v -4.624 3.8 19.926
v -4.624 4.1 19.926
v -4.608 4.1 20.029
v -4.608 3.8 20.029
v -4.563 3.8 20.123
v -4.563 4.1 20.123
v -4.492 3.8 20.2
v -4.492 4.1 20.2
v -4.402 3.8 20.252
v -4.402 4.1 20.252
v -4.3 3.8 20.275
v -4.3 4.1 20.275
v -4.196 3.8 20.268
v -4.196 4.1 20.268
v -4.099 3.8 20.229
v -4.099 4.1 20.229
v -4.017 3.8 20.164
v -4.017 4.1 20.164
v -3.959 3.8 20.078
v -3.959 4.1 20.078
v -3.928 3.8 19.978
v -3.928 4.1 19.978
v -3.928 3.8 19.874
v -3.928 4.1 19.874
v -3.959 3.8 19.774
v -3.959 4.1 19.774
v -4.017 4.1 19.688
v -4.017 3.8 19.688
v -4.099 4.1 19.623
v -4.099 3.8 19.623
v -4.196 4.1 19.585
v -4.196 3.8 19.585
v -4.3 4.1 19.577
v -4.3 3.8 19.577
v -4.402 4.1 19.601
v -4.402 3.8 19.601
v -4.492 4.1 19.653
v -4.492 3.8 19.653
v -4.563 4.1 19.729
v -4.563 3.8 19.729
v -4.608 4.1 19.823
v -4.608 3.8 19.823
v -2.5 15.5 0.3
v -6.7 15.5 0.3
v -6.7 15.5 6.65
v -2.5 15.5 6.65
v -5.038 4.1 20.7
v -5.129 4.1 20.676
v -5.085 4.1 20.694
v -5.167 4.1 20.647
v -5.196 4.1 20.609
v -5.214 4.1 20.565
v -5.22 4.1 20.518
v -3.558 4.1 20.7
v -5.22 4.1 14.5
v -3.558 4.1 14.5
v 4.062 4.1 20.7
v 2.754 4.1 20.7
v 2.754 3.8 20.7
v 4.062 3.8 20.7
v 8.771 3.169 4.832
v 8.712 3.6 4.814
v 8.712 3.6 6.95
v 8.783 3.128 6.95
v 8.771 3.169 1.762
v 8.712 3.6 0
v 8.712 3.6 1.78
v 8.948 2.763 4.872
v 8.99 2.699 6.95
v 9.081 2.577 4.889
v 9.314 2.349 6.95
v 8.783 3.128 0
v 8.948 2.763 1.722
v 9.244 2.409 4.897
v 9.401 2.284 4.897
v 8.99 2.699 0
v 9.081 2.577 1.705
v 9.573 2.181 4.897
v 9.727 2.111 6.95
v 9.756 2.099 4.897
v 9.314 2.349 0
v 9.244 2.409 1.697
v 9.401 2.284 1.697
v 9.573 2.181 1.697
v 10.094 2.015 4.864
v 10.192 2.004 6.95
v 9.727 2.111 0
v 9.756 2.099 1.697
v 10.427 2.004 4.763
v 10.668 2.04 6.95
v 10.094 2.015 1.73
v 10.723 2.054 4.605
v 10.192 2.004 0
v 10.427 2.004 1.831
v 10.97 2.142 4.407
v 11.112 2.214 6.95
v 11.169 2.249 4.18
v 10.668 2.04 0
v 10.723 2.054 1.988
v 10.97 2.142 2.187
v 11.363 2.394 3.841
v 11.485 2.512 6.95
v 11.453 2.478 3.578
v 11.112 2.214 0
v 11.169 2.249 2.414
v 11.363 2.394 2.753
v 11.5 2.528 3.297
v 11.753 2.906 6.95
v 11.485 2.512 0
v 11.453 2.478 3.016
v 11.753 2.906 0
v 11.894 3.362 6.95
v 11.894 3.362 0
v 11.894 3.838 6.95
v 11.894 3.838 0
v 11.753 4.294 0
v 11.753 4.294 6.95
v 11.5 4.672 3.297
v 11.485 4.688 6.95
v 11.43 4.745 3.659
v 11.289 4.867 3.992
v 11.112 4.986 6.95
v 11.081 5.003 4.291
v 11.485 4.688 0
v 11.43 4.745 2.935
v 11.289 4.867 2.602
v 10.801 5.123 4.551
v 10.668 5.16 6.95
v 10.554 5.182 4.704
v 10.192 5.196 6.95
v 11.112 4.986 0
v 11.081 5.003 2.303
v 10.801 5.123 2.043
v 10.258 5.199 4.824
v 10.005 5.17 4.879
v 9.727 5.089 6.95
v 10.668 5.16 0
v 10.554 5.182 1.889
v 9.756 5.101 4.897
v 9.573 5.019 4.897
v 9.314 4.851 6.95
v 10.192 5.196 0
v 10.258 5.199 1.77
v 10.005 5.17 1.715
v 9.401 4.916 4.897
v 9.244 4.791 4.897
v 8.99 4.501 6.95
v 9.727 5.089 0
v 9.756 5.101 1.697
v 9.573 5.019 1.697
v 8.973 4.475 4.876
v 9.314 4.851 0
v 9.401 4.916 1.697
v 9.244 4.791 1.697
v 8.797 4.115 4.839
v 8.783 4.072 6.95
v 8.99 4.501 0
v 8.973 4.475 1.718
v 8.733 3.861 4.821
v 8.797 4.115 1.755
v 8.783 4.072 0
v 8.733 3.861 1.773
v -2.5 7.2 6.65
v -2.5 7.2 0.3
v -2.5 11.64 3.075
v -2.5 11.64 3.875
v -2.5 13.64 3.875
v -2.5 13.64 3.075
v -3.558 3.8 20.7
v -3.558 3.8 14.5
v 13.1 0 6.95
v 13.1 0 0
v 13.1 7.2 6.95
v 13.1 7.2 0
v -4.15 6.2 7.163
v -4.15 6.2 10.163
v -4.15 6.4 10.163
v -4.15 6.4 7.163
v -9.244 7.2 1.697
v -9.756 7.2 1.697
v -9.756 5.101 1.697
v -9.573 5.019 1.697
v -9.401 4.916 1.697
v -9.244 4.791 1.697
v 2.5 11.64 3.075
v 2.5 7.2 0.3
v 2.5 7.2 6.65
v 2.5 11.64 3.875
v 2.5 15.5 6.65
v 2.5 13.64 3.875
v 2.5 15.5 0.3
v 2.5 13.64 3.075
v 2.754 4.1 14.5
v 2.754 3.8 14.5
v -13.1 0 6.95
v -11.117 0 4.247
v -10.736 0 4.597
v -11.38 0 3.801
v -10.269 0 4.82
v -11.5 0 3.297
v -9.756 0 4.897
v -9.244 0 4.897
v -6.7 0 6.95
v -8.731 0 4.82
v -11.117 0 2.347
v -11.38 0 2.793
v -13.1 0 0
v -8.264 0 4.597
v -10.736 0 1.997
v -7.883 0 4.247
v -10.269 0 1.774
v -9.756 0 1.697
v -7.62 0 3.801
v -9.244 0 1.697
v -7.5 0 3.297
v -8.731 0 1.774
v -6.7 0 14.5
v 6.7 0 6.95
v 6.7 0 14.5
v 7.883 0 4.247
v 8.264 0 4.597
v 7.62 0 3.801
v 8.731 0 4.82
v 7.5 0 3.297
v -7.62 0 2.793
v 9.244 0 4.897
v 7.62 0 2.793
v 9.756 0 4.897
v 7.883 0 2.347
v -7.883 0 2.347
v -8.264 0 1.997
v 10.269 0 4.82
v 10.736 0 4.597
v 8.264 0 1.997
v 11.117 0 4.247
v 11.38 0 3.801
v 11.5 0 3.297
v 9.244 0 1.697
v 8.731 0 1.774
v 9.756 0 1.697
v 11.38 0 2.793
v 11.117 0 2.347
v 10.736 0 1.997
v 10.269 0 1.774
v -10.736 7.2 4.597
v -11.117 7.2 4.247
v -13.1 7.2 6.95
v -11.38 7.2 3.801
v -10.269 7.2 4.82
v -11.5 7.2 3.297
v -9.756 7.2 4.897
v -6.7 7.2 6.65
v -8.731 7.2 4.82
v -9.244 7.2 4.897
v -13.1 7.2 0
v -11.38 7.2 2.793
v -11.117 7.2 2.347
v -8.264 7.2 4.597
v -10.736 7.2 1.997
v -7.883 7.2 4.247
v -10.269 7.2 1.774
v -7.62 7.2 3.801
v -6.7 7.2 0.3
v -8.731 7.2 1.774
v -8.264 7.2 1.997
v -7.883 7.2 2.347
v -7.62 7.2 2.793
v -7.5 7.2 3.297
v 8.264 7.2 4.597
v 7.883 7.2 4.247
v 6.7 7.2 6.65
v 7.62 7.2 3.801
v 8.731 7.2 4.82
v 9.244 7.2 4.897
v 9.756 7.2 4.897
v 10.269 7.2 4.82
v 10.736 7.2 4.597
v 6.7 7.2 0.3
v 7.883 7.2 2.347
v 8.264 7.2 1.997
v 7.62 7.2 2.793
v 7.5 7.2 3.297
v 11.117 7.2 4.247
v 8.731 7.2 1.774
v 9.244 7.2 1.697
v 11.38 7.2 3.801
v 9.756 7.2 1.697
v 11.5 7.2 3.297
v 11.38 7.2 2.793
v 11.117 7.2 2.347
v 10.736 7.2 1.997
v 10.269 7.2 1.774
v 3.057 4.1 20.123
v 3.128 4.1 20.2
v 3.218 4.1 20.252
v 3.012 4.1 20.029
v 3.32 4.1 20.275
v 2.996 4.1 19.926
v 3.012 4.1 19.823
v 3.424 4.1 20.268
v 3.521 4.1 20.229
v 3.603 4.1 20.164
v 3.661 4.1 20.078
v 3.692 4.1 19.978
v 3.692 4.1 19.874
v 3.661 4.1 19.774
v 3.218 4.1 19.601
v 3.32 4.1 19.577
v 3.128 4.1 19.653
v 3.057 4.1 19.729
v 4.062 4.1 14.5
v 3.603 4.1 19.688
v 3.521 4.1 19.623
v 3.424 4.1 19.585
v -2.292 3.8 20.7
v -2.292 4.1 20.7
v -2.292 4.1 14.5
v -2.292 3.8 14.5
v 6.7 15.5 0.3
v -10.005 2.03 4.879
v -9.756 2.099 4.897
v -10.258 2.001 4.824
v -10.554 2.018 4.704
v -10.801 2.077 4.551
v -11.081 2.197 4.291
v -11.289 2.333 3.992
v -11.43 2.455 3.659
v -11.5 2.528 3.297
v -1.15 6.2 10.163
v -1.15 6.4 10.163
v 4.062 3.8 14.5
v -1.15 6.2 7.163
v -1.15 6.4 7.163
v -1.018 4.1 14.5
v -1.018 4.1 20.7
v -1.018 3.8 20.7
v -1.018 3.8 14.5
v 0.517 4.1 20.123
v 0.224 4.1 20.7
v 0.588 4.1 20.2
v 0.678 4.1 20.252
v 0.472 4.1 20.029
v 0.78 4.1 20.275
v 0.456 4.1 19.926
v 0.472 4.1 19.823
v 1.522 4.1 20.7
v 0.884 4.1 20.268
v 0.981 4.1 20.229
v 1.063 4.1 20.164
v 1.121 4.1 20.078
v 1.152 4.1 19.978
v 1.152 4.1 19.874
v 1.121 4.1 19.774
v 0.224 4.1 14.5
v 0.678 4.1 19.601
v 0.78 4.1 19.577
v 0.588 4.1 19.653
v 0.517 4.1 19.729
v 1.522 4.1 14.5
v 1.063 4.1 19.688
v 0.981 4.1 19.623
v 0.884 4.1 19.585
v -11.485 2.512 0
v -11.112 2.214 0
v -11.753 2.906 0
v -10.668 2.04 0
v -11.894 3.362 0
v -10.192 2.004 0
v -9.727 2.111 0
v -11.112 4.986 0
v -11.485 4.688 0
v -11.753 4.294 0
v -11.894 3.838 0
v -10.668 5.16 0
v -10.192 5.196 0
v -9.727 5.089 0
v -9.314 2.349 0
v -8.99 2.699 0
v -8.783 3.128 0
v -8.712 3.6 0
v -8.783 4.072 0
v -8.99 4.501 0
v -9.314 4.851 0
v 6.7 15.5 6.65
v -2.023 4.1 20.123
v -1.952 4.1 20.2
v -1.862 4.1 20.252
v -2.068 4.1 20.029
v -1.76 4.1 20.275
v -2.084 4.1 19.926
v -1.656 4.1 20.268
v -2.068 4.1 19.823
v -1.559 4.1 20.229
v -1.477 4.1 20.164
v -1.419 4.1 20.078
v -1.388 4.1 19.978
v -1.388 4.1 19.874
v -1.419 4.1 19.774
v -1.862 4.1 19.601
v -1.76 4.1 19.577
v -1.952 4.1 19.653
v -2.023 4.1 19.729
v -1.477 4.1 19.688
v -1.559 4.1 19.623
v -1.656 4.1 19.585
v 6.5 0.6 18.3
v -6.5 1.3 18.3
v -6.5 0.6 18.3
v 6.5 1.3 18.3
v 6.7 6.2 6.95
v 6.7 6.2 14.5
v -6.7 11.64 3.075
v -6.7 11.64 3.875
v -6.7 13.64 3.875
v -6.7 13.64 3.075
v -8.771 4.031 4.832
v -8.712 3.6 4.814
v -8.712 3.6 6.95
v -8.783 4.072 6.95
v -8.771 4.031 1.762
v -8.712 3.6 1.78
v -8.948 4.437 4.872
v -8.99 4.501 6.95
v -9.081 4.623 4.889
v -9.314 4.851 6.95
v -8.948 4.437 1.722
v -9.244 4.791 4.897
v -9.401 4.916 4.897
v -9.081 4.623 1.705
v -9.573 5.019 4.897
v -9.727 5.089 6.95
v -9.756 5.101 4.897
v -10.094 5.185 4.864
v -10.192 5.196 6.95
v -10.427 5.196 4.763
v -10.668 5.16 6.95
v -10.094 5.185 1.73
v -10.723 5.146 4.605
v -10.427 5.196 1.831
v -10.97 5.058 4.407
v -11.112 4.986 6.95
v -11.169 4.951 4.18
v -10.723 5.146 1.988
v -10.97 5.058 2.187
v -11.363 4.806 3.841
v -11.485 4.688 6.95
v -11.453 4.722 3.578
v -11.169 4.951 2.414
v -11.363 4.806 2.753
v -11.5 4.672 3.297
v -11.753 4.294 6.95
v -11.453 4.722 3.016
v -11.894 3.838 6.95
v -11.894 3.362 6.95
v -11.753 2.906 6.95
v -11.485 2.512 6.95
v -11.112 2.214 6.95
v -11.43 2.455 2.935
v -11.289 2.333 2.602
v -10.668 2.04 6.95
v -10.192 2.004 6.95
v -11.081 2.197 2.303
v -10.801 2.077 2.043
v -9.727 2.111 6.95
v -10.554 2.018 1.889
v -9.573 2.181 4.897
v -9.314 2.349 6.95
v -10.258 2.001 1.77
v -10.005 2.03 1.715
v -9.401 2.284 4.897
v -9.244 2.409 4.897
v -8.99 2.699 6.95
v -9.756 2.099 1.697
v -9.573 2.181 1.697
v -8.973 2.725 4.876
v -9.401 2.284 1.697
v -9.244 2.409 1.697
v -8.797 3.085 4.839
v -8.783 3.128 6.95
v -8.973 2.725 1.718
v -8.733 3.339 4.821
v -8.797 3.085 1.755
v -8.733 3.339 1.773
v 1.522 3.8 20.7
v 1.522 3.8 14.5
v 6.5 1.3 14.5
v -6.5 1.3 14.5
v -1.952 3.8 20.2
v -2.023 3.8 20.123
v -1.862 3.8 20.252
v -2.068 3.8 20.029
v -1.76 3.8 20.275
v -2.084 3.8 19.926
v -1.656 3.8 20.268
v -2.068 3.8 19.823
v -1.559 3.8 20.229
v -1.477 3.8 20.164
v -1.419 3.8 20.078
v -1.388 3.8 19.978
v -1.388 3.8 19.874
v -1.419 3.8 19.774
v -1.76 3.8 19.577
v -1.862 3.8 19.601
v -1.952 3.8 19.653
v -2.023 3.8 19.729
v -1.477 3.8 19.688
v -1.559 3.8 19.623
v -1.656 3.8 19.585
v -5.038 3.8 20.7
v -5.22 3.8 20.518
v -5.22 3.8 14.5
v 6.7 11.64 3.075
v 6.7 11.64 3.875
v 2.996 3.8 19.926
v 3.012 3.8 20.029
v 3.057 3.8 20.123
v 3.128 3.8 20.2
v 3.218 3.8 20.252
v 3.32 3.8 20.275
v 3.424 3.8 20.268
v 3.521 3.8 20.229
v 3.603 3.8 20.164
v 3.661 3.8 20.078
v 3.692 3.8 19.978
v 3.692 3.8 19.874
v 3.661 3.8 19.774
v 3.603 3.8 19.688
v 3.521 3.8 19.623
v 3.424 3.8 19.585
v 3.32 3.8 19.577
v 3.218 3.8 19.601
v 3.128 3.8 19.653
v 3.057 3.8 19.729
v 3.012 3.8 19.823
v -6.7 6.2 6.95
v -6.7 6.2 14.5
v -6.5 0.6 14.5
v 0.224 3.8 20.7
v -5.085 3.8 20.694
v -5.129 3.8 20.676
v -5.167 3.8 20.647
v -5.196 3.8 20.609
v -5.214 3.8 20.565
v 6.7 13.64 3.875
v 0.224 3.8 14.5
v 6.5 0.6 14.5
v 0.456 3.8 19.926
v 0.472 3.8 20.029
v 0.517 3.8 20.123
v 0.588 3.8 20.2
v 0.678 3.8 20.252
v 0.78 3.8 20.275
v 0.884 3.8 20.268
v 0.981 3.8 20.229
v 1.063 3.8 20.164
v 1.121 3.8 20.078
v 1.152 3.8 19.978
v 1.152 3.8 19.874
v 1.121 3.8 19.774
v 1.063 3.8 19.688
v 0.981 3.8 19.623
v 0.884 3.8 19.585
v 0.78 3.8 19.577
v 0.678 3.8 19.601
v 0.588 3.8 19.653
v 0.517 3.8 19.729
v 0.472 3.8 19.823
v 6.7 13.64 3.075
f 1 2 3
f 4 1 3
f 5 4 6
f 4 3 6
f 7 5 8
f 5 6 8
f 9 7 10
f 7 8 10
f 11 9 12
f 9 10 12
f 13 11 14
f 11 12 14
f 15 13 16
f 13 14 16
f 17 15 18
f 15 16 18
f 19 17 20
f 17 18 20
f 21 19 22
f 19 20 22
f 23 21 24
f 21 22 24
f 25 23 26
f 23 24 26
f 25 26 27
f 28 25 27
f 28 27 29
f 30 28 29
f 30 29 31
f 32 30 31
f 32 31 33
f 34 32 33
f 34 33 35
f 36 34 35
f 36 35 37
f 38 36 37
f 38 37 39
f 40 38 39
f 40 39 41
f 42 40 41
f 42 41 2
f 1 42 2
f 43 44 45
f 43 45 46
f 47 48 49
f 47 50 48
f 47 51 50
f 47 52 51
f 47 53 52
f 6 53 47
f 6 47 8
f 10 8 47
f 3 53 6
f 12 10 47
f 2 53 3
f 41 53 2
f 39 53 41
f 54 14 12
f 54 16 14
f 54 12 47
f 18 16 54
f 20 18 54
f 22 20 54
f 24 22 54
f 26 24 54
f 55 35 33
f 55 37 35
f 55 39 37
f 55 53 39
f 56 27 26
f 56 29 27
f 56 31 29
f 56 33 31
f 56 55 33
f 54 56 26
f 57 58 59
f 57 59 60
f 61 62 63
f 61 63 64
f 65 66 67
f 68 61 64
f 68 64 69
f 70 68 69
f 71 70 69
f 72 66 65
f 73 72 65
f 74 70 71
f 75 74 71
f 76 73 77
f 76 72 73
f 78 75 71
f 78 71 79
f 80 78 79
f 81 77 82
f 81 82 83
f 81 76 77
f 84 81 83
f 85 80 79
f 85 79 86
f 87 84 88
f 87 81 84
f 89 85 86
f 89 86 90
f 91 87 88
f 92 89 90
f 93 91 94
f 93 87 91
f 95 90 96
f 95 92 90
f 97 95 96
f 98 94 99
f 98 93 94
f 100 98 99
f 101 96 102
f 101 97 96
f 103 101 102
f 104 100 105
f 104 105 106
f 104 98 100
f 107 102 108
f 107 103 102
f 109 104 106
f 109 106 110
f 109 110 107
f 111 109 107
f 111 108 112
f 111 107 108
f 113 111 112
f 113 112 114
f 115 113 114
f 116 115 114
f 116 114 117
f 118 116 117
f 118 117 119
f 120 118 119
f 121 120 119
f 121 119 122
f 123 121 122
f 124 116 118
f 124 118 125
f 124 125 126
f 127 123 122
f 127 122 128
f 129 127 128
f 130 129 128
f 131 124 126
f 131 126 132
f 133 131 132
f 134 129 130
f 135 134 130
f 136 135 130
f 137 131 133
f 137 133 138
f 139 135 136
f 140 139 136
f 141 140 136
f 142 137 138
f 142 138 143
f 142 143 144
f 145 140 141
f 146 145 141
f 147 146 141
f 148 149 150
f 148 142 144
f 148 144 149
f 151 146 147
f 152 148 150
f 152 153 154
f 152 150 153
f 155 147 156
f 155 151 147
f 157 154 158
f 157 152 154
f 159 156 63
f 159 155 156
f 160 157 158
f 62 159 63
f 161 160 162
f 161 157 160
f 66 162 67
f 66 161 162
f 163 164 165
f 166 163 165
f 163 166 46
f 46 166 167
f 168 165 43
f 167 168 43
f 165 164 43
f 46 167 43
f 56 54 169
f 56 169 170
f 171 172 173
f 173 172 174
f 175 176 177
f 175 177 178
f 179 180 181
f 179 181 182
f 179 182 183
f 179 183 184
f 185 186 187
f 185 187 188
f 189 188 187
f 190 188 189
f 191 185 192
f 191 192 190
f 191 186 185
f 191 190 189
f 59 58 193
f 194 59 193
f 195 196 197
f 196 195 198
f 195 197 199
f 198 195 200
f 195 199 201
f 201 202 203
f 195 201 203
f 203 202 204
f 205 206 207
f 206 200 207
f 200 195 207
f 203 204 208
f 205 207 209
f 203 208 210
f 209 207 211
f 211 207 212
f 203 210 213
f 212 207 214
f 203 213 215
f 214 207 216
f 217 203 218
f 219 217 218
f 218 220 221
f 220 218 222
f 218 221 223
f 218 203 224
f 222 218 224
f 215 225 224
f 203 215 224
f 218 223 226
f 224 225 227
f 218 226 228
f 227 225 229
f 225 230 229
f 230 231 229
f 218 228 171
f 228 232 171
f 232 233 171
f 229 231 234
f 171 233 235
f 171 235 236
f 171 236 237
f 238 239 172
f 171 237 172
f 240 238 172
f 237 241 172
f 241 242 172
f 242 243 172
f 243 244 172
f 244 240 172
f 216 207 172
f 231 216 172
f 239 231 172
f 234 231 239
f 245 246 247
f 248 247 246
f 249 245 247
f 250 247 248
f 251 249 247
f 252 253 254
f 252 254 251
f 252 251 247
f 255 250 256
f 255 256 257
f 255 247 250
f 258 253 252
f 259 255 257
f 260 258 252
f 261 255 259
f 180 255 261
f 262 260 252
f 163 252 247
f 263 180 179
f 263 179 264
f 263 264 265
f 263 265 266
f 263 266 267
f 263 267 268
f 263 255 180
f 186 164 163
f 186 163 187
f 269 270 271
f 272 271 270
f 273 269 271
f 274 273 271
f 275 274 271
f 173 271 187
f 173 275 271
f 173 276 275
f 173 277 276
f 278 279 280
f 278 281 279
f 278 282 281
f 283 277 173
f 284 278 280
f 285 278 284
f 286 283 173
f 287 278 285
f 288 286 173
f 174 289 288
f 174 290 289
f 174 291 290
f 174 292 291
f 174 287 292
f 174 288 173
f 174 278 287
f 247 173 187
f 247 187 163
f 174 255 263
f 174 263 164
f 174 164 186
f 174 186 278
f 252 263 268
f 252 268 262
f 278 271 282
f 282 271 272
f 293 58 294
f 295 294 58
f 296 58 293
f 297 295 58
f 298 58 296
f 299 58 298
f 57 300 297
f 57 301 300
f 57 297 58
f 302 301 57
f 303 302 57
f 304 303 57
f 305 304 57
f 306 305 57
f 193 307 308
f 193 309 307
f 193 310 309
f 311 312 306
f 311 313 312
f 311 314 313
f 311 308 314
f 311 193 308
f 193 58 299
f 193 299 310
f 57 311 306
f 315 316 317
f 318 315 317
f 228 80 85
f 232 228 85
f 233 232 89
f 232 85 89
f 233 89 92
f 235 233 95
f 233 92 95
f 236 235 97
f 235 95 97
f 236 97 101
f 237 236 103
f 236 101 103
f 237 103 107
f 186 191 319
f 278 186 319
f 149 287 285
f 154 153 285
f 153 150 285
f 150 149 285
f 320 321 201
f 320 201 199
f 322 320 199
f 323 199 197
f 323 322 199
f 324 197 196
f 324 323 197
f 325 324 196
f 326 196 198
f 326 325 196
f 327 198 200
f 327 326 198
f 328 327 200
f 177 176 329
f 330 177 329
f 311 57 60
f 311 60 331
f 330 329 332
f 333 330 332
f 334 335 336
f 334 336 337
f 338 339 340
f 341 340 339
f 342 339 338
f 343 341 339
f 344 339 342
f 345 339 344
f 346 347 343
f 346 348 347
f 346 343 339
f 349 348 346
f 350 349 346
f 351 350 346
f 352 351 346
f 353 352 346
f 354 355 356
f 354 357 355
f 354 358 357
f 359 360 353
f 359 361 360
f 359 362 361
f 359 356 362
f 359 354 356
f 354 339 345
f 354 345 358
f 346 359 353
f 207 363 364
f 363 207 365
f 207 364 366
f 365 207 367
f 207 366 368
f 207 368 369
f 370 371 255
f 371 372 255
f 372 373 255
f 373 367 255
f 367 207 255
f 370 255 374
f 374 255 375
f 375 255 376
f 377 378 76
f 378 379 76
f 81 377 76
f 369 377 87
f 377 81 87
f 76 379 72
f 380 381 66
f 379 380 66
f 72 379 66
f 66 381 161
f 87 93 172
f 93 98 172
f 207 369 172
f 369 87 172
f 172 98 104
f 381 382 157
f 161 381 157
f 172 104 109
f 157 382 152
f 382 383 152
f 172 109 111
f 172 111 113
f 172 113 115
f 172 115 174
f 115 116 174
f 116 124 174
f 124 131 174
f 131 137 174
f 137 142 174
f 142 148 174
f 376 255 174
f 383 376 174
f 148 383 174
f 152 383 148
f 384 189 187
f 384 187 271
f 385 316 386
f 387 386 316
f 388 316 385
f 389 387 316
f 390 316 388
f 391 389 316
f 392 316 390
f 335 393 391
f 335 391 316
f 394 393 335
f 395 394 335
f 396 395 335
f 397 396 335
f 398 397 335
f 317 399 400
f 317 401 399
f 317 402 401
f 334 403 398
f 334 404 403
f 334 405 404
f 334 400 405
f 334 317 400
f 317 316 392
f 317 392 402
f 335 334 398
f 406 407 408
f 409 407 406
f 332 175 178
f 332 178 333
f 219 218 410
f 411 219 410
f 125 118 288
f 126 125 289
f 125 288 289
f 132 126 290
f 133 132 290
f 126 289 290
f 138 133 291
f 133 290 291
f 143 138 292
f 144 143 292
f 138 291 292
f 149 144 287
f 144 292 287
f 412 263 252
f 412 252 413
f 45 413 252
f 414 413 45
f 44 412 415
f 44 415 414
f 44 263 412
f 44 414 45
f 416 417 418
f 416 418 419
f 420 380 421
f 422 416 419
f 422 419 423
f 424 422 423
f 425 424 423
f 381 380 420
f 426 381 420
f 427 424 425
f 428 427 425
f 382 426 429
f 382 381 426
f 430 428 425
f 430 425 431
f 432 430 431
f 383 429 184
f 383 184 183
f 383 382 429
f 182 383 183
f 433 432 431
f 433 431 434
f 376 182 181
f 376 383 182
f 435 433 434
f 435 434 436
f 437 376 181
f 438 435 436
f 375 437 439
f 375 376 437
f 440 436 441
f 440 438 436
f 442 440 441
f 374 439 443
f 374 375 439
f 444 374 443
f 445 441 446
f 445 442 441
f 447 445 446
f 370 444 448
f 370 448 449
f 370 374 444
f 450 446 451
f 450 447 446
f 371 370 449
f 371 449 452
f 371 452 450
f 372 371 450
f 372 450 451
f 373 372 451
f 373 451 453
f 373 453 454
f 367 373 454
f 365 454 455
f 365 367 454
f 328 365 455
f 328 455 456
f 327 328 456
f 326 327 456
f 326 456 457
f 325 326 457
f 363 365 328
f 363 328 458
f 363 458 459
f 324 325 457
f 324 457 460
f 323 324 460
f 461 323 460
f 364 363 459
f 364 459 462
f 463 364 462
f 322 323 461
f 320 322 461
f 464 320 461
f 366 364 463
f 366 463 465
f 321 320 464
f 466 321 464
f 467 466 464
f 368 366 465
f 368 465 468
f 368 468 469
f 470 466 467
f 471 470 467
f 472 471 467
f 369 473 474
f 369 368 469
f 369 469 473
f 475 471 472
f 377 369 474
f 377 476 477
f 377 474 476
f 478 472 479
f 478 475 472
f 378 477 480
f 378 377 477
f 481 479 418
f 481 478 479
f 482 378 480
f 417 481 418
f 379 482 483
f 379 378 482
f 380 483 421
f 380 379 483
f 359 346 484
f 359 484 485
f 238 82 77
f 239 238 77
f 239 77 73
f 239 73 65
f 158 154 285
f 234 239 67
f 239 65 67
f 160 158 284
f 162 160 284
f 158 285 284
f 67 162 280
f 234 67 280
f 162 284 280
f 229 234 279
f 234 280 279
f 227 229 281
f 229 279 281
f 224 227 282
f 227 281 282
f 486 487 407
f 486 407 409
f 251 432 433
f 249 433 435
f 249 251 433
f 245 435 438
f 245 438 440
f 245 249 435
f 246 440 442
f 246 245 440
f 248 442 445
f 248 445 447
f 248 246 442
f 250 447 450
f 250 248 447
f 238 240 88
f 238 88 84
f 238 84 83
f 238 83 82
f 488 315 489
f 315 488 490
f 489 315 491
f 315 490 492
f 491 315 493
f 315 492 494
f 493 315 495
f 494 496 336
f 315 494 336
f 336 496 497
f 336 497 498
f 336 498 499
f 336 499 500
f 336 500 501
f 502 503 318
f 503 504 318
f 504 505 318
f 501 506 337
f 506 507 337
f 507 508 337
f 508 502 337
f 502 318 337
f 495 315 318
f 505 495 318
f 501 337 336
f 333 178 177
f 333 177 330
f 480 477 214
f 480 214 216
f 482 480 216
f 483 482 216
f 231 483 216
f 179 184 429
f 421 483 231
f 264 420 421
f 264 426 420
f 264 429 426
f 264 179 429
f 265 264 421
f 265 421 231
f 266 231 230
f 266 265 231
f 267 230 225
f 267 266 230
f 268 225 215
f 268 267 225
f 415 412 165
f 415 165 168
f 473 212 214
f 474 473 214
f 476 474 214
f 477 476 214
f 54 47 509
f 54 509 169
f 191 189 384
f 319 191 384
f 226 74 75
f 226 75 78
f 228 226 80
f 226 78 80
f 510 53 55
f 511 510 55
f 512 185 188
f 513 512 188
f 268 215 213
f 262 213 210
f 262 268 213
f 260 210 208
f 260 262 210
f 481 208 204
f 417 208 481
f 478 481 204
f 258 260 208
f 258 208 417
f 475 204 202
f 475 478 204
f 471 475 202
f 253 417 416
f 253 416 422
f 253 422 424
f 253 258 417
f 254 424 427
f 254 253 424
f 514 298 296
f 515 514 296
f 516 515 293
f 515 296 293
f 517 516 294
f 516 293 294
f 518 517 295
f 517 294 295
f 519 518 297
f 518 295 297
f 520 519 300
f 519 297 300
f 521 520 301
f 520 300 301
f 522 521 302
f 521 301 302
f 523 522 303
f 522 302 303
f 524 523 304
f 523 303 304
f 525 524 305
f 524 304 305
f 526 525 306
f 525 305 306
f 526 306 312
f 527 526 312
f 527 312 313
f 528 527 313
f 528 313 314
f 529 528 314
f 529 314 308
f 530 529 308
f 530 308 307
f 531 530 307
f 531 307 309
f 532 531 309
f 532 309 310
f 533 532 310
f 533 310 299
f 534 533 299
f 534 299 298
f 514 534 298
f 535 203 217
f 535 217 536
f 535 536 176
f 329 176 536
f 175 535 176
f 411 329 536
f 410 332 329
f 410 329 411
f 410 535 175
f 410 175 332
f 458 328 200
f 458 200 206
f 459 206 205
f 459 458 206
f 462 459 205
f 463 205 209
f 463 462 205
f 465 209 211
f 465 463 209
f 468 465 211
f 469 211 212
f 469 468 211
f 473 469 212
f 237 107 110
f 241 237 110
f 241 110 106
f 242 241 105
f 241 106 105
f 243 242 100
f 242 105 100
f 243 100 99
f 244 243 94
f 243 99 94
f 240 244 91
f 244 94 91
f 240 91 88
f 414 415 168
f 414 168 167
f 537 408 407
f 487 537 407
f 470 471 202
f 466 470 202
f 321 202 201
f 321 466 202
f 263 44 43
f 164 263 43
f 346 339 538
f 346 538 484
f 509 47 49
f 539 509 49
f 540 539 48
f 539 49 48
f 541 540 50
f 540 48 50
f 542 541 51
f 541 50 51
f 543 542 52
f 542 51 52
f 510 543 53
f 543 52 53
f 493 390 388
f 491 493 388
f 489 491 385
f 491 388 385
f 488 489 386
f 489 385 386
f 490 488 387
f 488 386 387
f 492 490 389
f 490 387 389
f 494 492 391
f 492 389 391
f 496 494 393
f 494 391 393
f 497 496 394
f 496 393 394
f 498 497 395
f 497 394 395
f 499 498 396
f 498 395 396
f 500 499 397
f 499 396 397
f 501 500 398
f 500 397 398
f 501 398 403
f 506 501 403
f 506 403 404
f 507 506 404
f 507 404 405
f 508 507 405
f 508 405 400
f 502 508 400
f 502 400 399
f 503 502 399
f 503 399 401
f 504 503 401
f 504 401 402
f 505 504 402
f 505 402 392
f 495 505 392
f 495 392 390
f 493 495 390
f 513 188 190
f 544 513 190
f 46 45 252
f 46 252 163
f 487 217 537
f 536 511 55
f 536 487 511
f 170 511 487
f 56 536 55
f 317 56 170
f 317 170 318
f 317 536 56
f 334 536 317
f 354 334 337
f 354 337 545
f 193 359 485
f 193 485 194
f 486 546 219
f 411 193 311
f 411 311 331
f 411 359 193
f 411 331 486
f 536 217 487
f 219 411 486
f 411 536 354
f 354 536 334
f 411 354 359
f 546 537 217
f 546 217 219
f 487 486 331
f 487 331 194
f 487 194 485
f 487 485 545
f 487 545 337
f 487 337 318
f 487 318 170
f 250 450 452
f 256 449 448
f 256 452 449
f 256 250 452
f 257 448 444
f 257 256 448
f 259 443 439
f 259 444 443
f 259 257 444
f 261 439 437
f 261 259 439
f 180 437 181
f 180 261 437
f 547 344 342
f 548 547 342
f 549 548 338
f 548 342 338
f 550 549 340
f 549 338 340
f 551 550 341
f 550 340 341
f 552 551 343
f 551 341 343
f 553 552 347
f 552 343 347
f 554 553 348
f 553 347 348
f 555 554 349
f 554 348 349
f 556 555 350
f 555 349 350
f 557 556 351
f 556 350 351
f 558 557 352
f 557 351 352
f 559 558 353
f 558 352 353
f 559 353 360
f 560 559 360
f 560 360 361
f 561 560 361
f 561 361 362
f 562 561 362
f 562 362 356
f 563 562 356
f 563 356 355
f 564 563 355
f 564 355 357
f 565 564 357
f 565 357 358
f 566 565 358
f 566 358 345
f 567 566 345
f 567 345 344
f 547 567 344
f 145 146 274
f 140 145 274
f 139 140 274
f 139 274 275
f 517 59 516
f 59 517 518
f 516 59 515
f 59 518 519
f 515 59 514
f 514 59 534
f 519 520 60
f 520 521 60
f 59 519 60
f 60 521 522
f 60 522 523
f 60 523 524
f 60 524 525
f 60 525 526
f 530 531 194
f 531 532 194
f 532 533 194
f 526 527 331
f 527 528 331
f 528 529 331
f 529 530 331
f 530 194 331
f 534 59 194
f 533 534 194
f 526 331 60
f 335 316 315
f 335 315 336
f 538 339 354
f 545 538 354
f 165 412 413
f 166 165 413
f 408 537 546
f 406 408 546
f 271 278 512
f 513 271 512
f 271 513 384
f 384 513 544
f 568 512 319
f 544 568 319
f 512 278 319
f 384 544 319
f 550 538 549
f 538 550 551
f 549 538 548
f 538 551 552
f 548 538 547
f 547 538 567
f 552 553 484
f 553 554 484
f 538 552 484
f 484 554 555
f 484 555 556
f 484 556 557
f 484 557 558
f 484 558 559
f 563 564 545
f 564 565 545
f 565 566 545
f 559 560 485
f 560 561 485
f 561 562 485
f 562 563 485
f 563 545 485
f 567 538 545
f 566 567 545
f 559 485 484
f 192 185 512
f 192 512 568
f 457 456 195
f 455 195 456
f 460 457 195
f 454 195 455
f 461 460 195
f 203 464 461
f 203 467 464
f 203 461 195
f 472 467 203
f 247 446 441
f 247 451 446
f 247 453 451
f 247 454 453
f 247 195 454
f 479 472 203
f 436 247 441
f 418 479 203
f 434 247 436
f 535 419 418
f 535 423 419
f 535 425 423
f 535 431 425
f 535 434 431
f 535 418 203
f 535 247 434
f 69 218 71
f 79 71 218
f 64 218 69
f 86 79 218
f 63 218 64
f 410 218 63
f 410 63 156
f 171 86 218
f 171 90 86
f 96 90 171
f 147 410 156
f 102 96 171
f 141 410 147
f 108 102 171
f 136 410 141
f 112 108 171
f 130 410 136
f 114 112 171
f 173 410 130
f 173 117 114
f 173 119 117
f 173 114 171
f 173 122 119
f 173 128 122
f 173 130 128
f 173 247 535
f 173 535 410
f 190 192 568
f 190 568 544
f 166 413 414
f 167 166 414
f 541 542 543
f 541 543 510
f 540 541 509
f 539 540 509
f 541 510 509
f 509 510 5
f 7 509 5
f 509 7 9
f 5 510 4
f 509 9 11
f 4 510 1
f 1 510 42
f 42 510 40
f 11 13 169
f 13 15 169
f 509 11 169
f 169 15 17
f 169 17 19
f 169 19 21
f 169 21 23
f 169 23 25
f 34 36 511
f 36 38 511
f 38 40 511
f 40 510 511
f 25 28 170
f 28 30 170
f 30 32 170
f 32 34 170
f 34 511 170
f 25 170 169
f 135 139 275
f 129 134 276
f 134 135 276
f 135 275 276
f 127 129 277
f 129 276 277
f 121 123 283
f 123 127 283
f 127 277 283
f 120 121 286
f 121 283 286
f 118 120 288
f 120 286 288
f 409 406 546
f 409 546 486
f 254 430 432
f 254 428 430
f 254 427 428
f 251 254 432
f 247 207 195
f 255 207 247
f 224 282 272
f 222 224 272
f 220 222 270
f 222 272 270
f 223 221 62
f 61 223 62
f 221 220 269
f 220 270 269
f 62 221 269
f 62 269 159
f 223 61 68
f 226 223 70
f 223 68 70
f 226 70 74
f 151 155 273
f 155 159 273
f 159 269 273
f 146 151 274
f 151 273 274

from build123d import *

# Parameters (mm, degrees)
SKETCH1_W                = 26.2
SKETCH1_H                = 7.2
SKETCH1_R                = 1.6
BOSS_EXTRUDE1_DEPTH      = 6.95
BOSS_EXTRUDE2_DEPTH      = 3.175
BOSS_EXTRUDE2_DEPTH_BACK = 3.175
SKETCH2_W                = 4.2
SKETCH2_H                = 8.3
SKETCH3_W                = 0.8
SKETCH3_H                = 2
CUT_EXTRUDE1_DEPTH       = 27.088167816
SKETCH4_W                = 13.4
SKETCH4_H                = 6.2
BOSS_EXTRUDE3_DEPTH      = 7.55
SKETCH5_W                = 13
SKETCH5_H                = 0.7
BOSS_EXTRUDE4_DEPTH      = 3.8
SKETCH6_W                = 11.057539052
SKETCH6_H                = 0.3
BOSS_EXTRUDE5_DEPTH      = 6.2
SKETCH7_R                = 0.35
SKETCH7_W                = 0.673728729
SKETCH7_H                = 6.2
SKETCH7_W_2              = 0.592367936
SKETCH7_W_3              = 0.568302757
SKETCH7_W_4              = 0.558499764
SKETCH7_W_5              = 0.793155974
CUT_EXTRUDE3_DEPTH       = 2
CUT_EXTRUDE4_DEPTH       = 26.864841001
SKETCH10_W               = 3
SKETCH10_H               = 3
BOSS_EXTRUDE6_DEPTH      = 0.2


with BuildPart() as part:
    # Sketch1 → Boss-Extrude1 (new body)
    with BuildSketch(Plane.XY):
        with Locations((0, 3.6)):
            Rectangle(SKETCH1_W, SKETCH1_H)
        with Locations((-10.311776953, 3.6)):
            Circle(SKETCH1_R, mode=Mode.SUBTRACT)
        with Locations(Location((10.311776953, 3.6, 0), (0, 0, 180))):
            Circle(SKETCH1_R, mode=Mode.SUBTRACT)
    extrude(amount=BOSS_EXTRUDE1_DEPTH)

    # Sketch2 → Boss-Extrude2 (add, two sides: drawn at the far end of the back side and taken through both)
    with BuildSketch(Plane.XY.offset(3.475).offset(-BOSS_EXTRUDE2_DEPTH_BACK)):
        with Locations((-4.6, 11.35)):
            Rectangle(SKETCH2_W, SKETCH2_H)
        with Locations((4.6, 11.35)):
            Rectangle(SKETCH2_W, SKETCH2_H)
    extrude(amount=BOSS_EXTRUDE2_DEPTH + BOSS_EXTRUDE2_DEPTH_BACK)

    # Sketch3 → Cut-Extrude1 (cut, through all)
    with BuildSketch(Plane.ZY.offset(6.7)):
        with Locations((3.475, 12.64)):
            Rectangle(SKETCH3_W, SKETCH3_H)
    extrude(amount=-CUT_EXTRUDE1_DEPTH, mode=Mode.SUBTRACT)

    # Sketch4 → Boss-Extrude3 (add)
    with BuildSketch(Plane.XY.offset(6.95)):
        with Locations((0, 3.1)):
            Rectangle(SKETCH4_W, SKETCH4_H)
    extrude(amount=BOSS_EXTRUDE3_DEPTH)

    # Sketch5 → Boss-Extrude4 (add)
    with BuildSketch(Plane.XY.offset(14.5)):
        with Locations((0, 0.95)):
            Rectangle(SKETCH5_W, SKETCH5_H)
    extrude(amount=BOSS_EXTRUDE4_DEPTH)

    # Sketch6 → Boss-Extrude5 (add)
    with BuildSketch(Plane.XY.offset(14.5)):
        with Locations((0, 3.95)):
            Rectangle(SKETCH6_W, SKETCH6_H)
    extrude(amount=BOSS_EXTRUDE5_DEPTH)

    # Sketch7 → Cut-Extrude3 (cut)
    with BuildSketch(Plane(origin=(0, 4.1, 0), x_dir=(1, 0, 0), z_dir=(0, 1, 0))):
        Polygon((-5.219979377, -20.517795083), (-5.219979377, -14.5), (-5.528769526, -14.5), (-5.528769526, -20.7), (-5.219979377, -20.7), align=None)
        with Locations(Location((-4.273866855, -19.926328783, 0), (0, 0, 180))):
            Circle(SKETCH7_R)
        with Locations((-3.221250813, -17.6)):
            Rectangle(SKETCH7_W, SKETCH7_H)
        with Locations((-2.58820248, -17.6)):
            Rectangle(SKETCH7_W_2, SKETCH7_H)
        with Locations(Location((-1.733866855, -19.926328783, 0), (0, 0, 180))):
            Circle(SKETCH7_R)
        with Locations((-0.681250813, -17.6)):
            Rectangle(SKETCH7_W, SKETCH7_H)
        with Locations((-0.06023507, -17.6)):
            Rectangle(SKETCH7_W_3, SKETCH7_H)
        with Locations((1.858749188, -17.6)):
            Rectangle(SKETCH7_W, SKETCH7_H)
        with Locations((2.474863434, -17.6)):
            Rectangle(SKETCH7_W_4, SKETCH7_H)
        with Locations((4.398749187, -17.6)):
            Rectangle(SKETCH7_W, SKETCH7_H)
        with Locations((5.132191539, -17.6)):
            Rectangle(SKETCH7_W_5, SKETCH7_H)
        with BuildLine():
            Line((-5.219979377, -20.7), (-5.03777446, -20.7))
            ThreePointArc((-5.03777446, -20.7), (-5.166612793, -20.646633415), (-5.219979377, -20.517795083))
            Line((-5.219979377, -20.517795083), (-5.219979377, -20.7))
        make_face()
        with Locations(Location((0.806133145, -19.926328783, 0), (0, 0, 180))):
            Circle(SKETCH7_R)
        with Locations(Location((3.346133145, -19.926328783, 0), (0, 0, 180))):
            Circle(SKETCH7_R)
    extrude(amount=-CUT_EXTRUDE3_DEPTH, mode=Mode.SUBTRACT)

    # Sketch9 → Cut-Extrude4 (cut, through all)
    with BuildSketch(Plane(origin=(0, 7.2, 0), x_dir=(1, 0, 0), z_dir=(0, 1, 0))):
        with BuildLine():
            Line((9.243559577, -4.896961438), (9.756440423, -4.896961438))
            ThreePointArc((9.756440423, -4.896961438), (10.939656379, -4.436341133), (11.5, -3.296961438))
            ThreePointArc((11.5, -3.296961438), (10.939656379, -2.157581742), (9.756440423, -1.696961438))
            Line((9.756440423, -1.696961438), (9.243559577, -1.696961438))
            ThreePointArc((9.243559577, -1.696961438), (8.060343621, -2.157581742), (7.5, -3.296961438))
            ThreePointArc((7.5, -3.296961438), (8.060343621, -4.436341133), (9.243559577, -4.896961438))
        make_face()
        with BuildLine():
            Line((-9.243559577, -4.896961438), (-9.756440423, -4.896961438))
            ThreePointArc((-9.756440423, -4.896961438), (-10.939656379, -4.436341133), (-11.5, -3.296961438))
            ThreePointArc((-11.5, -3.296961438), (-10.939656379, -2.157581742), (-9.756440423, -1.696961438))
            Line((-9.756440423, -1.696961438), (-9.243559577, -1.696961438))
            ThreePointArc((-9.243559577, -1.696961438), (-8.060343621, -2.157581742), (-7.5, -3.296961438))
            ThreePointArc((-7.5, -3.296961438), (-8.060343621, -4.436341133), (-9.243559577, -4.896961438))
        make_face()
    extrude(amount=-CUT_EXTRUDE4_DEPTH, mode=Mode.SUBTRACT)

    # Sketch10 → Boss-Extrude6 (add)
    with BuildSketch(Plane(origin=(0, 6.2, 0), x_dir=(1, 0, 0), z_dir=(0, 1, 0))):
        with Locations((-2.650474803, -8.66301906)):
            Rectangle(SKETCH10_W, SKETCH10_H)
    extrude(amount=BOSS_EXTRUDE6_DEPTH)


solid = part.part
